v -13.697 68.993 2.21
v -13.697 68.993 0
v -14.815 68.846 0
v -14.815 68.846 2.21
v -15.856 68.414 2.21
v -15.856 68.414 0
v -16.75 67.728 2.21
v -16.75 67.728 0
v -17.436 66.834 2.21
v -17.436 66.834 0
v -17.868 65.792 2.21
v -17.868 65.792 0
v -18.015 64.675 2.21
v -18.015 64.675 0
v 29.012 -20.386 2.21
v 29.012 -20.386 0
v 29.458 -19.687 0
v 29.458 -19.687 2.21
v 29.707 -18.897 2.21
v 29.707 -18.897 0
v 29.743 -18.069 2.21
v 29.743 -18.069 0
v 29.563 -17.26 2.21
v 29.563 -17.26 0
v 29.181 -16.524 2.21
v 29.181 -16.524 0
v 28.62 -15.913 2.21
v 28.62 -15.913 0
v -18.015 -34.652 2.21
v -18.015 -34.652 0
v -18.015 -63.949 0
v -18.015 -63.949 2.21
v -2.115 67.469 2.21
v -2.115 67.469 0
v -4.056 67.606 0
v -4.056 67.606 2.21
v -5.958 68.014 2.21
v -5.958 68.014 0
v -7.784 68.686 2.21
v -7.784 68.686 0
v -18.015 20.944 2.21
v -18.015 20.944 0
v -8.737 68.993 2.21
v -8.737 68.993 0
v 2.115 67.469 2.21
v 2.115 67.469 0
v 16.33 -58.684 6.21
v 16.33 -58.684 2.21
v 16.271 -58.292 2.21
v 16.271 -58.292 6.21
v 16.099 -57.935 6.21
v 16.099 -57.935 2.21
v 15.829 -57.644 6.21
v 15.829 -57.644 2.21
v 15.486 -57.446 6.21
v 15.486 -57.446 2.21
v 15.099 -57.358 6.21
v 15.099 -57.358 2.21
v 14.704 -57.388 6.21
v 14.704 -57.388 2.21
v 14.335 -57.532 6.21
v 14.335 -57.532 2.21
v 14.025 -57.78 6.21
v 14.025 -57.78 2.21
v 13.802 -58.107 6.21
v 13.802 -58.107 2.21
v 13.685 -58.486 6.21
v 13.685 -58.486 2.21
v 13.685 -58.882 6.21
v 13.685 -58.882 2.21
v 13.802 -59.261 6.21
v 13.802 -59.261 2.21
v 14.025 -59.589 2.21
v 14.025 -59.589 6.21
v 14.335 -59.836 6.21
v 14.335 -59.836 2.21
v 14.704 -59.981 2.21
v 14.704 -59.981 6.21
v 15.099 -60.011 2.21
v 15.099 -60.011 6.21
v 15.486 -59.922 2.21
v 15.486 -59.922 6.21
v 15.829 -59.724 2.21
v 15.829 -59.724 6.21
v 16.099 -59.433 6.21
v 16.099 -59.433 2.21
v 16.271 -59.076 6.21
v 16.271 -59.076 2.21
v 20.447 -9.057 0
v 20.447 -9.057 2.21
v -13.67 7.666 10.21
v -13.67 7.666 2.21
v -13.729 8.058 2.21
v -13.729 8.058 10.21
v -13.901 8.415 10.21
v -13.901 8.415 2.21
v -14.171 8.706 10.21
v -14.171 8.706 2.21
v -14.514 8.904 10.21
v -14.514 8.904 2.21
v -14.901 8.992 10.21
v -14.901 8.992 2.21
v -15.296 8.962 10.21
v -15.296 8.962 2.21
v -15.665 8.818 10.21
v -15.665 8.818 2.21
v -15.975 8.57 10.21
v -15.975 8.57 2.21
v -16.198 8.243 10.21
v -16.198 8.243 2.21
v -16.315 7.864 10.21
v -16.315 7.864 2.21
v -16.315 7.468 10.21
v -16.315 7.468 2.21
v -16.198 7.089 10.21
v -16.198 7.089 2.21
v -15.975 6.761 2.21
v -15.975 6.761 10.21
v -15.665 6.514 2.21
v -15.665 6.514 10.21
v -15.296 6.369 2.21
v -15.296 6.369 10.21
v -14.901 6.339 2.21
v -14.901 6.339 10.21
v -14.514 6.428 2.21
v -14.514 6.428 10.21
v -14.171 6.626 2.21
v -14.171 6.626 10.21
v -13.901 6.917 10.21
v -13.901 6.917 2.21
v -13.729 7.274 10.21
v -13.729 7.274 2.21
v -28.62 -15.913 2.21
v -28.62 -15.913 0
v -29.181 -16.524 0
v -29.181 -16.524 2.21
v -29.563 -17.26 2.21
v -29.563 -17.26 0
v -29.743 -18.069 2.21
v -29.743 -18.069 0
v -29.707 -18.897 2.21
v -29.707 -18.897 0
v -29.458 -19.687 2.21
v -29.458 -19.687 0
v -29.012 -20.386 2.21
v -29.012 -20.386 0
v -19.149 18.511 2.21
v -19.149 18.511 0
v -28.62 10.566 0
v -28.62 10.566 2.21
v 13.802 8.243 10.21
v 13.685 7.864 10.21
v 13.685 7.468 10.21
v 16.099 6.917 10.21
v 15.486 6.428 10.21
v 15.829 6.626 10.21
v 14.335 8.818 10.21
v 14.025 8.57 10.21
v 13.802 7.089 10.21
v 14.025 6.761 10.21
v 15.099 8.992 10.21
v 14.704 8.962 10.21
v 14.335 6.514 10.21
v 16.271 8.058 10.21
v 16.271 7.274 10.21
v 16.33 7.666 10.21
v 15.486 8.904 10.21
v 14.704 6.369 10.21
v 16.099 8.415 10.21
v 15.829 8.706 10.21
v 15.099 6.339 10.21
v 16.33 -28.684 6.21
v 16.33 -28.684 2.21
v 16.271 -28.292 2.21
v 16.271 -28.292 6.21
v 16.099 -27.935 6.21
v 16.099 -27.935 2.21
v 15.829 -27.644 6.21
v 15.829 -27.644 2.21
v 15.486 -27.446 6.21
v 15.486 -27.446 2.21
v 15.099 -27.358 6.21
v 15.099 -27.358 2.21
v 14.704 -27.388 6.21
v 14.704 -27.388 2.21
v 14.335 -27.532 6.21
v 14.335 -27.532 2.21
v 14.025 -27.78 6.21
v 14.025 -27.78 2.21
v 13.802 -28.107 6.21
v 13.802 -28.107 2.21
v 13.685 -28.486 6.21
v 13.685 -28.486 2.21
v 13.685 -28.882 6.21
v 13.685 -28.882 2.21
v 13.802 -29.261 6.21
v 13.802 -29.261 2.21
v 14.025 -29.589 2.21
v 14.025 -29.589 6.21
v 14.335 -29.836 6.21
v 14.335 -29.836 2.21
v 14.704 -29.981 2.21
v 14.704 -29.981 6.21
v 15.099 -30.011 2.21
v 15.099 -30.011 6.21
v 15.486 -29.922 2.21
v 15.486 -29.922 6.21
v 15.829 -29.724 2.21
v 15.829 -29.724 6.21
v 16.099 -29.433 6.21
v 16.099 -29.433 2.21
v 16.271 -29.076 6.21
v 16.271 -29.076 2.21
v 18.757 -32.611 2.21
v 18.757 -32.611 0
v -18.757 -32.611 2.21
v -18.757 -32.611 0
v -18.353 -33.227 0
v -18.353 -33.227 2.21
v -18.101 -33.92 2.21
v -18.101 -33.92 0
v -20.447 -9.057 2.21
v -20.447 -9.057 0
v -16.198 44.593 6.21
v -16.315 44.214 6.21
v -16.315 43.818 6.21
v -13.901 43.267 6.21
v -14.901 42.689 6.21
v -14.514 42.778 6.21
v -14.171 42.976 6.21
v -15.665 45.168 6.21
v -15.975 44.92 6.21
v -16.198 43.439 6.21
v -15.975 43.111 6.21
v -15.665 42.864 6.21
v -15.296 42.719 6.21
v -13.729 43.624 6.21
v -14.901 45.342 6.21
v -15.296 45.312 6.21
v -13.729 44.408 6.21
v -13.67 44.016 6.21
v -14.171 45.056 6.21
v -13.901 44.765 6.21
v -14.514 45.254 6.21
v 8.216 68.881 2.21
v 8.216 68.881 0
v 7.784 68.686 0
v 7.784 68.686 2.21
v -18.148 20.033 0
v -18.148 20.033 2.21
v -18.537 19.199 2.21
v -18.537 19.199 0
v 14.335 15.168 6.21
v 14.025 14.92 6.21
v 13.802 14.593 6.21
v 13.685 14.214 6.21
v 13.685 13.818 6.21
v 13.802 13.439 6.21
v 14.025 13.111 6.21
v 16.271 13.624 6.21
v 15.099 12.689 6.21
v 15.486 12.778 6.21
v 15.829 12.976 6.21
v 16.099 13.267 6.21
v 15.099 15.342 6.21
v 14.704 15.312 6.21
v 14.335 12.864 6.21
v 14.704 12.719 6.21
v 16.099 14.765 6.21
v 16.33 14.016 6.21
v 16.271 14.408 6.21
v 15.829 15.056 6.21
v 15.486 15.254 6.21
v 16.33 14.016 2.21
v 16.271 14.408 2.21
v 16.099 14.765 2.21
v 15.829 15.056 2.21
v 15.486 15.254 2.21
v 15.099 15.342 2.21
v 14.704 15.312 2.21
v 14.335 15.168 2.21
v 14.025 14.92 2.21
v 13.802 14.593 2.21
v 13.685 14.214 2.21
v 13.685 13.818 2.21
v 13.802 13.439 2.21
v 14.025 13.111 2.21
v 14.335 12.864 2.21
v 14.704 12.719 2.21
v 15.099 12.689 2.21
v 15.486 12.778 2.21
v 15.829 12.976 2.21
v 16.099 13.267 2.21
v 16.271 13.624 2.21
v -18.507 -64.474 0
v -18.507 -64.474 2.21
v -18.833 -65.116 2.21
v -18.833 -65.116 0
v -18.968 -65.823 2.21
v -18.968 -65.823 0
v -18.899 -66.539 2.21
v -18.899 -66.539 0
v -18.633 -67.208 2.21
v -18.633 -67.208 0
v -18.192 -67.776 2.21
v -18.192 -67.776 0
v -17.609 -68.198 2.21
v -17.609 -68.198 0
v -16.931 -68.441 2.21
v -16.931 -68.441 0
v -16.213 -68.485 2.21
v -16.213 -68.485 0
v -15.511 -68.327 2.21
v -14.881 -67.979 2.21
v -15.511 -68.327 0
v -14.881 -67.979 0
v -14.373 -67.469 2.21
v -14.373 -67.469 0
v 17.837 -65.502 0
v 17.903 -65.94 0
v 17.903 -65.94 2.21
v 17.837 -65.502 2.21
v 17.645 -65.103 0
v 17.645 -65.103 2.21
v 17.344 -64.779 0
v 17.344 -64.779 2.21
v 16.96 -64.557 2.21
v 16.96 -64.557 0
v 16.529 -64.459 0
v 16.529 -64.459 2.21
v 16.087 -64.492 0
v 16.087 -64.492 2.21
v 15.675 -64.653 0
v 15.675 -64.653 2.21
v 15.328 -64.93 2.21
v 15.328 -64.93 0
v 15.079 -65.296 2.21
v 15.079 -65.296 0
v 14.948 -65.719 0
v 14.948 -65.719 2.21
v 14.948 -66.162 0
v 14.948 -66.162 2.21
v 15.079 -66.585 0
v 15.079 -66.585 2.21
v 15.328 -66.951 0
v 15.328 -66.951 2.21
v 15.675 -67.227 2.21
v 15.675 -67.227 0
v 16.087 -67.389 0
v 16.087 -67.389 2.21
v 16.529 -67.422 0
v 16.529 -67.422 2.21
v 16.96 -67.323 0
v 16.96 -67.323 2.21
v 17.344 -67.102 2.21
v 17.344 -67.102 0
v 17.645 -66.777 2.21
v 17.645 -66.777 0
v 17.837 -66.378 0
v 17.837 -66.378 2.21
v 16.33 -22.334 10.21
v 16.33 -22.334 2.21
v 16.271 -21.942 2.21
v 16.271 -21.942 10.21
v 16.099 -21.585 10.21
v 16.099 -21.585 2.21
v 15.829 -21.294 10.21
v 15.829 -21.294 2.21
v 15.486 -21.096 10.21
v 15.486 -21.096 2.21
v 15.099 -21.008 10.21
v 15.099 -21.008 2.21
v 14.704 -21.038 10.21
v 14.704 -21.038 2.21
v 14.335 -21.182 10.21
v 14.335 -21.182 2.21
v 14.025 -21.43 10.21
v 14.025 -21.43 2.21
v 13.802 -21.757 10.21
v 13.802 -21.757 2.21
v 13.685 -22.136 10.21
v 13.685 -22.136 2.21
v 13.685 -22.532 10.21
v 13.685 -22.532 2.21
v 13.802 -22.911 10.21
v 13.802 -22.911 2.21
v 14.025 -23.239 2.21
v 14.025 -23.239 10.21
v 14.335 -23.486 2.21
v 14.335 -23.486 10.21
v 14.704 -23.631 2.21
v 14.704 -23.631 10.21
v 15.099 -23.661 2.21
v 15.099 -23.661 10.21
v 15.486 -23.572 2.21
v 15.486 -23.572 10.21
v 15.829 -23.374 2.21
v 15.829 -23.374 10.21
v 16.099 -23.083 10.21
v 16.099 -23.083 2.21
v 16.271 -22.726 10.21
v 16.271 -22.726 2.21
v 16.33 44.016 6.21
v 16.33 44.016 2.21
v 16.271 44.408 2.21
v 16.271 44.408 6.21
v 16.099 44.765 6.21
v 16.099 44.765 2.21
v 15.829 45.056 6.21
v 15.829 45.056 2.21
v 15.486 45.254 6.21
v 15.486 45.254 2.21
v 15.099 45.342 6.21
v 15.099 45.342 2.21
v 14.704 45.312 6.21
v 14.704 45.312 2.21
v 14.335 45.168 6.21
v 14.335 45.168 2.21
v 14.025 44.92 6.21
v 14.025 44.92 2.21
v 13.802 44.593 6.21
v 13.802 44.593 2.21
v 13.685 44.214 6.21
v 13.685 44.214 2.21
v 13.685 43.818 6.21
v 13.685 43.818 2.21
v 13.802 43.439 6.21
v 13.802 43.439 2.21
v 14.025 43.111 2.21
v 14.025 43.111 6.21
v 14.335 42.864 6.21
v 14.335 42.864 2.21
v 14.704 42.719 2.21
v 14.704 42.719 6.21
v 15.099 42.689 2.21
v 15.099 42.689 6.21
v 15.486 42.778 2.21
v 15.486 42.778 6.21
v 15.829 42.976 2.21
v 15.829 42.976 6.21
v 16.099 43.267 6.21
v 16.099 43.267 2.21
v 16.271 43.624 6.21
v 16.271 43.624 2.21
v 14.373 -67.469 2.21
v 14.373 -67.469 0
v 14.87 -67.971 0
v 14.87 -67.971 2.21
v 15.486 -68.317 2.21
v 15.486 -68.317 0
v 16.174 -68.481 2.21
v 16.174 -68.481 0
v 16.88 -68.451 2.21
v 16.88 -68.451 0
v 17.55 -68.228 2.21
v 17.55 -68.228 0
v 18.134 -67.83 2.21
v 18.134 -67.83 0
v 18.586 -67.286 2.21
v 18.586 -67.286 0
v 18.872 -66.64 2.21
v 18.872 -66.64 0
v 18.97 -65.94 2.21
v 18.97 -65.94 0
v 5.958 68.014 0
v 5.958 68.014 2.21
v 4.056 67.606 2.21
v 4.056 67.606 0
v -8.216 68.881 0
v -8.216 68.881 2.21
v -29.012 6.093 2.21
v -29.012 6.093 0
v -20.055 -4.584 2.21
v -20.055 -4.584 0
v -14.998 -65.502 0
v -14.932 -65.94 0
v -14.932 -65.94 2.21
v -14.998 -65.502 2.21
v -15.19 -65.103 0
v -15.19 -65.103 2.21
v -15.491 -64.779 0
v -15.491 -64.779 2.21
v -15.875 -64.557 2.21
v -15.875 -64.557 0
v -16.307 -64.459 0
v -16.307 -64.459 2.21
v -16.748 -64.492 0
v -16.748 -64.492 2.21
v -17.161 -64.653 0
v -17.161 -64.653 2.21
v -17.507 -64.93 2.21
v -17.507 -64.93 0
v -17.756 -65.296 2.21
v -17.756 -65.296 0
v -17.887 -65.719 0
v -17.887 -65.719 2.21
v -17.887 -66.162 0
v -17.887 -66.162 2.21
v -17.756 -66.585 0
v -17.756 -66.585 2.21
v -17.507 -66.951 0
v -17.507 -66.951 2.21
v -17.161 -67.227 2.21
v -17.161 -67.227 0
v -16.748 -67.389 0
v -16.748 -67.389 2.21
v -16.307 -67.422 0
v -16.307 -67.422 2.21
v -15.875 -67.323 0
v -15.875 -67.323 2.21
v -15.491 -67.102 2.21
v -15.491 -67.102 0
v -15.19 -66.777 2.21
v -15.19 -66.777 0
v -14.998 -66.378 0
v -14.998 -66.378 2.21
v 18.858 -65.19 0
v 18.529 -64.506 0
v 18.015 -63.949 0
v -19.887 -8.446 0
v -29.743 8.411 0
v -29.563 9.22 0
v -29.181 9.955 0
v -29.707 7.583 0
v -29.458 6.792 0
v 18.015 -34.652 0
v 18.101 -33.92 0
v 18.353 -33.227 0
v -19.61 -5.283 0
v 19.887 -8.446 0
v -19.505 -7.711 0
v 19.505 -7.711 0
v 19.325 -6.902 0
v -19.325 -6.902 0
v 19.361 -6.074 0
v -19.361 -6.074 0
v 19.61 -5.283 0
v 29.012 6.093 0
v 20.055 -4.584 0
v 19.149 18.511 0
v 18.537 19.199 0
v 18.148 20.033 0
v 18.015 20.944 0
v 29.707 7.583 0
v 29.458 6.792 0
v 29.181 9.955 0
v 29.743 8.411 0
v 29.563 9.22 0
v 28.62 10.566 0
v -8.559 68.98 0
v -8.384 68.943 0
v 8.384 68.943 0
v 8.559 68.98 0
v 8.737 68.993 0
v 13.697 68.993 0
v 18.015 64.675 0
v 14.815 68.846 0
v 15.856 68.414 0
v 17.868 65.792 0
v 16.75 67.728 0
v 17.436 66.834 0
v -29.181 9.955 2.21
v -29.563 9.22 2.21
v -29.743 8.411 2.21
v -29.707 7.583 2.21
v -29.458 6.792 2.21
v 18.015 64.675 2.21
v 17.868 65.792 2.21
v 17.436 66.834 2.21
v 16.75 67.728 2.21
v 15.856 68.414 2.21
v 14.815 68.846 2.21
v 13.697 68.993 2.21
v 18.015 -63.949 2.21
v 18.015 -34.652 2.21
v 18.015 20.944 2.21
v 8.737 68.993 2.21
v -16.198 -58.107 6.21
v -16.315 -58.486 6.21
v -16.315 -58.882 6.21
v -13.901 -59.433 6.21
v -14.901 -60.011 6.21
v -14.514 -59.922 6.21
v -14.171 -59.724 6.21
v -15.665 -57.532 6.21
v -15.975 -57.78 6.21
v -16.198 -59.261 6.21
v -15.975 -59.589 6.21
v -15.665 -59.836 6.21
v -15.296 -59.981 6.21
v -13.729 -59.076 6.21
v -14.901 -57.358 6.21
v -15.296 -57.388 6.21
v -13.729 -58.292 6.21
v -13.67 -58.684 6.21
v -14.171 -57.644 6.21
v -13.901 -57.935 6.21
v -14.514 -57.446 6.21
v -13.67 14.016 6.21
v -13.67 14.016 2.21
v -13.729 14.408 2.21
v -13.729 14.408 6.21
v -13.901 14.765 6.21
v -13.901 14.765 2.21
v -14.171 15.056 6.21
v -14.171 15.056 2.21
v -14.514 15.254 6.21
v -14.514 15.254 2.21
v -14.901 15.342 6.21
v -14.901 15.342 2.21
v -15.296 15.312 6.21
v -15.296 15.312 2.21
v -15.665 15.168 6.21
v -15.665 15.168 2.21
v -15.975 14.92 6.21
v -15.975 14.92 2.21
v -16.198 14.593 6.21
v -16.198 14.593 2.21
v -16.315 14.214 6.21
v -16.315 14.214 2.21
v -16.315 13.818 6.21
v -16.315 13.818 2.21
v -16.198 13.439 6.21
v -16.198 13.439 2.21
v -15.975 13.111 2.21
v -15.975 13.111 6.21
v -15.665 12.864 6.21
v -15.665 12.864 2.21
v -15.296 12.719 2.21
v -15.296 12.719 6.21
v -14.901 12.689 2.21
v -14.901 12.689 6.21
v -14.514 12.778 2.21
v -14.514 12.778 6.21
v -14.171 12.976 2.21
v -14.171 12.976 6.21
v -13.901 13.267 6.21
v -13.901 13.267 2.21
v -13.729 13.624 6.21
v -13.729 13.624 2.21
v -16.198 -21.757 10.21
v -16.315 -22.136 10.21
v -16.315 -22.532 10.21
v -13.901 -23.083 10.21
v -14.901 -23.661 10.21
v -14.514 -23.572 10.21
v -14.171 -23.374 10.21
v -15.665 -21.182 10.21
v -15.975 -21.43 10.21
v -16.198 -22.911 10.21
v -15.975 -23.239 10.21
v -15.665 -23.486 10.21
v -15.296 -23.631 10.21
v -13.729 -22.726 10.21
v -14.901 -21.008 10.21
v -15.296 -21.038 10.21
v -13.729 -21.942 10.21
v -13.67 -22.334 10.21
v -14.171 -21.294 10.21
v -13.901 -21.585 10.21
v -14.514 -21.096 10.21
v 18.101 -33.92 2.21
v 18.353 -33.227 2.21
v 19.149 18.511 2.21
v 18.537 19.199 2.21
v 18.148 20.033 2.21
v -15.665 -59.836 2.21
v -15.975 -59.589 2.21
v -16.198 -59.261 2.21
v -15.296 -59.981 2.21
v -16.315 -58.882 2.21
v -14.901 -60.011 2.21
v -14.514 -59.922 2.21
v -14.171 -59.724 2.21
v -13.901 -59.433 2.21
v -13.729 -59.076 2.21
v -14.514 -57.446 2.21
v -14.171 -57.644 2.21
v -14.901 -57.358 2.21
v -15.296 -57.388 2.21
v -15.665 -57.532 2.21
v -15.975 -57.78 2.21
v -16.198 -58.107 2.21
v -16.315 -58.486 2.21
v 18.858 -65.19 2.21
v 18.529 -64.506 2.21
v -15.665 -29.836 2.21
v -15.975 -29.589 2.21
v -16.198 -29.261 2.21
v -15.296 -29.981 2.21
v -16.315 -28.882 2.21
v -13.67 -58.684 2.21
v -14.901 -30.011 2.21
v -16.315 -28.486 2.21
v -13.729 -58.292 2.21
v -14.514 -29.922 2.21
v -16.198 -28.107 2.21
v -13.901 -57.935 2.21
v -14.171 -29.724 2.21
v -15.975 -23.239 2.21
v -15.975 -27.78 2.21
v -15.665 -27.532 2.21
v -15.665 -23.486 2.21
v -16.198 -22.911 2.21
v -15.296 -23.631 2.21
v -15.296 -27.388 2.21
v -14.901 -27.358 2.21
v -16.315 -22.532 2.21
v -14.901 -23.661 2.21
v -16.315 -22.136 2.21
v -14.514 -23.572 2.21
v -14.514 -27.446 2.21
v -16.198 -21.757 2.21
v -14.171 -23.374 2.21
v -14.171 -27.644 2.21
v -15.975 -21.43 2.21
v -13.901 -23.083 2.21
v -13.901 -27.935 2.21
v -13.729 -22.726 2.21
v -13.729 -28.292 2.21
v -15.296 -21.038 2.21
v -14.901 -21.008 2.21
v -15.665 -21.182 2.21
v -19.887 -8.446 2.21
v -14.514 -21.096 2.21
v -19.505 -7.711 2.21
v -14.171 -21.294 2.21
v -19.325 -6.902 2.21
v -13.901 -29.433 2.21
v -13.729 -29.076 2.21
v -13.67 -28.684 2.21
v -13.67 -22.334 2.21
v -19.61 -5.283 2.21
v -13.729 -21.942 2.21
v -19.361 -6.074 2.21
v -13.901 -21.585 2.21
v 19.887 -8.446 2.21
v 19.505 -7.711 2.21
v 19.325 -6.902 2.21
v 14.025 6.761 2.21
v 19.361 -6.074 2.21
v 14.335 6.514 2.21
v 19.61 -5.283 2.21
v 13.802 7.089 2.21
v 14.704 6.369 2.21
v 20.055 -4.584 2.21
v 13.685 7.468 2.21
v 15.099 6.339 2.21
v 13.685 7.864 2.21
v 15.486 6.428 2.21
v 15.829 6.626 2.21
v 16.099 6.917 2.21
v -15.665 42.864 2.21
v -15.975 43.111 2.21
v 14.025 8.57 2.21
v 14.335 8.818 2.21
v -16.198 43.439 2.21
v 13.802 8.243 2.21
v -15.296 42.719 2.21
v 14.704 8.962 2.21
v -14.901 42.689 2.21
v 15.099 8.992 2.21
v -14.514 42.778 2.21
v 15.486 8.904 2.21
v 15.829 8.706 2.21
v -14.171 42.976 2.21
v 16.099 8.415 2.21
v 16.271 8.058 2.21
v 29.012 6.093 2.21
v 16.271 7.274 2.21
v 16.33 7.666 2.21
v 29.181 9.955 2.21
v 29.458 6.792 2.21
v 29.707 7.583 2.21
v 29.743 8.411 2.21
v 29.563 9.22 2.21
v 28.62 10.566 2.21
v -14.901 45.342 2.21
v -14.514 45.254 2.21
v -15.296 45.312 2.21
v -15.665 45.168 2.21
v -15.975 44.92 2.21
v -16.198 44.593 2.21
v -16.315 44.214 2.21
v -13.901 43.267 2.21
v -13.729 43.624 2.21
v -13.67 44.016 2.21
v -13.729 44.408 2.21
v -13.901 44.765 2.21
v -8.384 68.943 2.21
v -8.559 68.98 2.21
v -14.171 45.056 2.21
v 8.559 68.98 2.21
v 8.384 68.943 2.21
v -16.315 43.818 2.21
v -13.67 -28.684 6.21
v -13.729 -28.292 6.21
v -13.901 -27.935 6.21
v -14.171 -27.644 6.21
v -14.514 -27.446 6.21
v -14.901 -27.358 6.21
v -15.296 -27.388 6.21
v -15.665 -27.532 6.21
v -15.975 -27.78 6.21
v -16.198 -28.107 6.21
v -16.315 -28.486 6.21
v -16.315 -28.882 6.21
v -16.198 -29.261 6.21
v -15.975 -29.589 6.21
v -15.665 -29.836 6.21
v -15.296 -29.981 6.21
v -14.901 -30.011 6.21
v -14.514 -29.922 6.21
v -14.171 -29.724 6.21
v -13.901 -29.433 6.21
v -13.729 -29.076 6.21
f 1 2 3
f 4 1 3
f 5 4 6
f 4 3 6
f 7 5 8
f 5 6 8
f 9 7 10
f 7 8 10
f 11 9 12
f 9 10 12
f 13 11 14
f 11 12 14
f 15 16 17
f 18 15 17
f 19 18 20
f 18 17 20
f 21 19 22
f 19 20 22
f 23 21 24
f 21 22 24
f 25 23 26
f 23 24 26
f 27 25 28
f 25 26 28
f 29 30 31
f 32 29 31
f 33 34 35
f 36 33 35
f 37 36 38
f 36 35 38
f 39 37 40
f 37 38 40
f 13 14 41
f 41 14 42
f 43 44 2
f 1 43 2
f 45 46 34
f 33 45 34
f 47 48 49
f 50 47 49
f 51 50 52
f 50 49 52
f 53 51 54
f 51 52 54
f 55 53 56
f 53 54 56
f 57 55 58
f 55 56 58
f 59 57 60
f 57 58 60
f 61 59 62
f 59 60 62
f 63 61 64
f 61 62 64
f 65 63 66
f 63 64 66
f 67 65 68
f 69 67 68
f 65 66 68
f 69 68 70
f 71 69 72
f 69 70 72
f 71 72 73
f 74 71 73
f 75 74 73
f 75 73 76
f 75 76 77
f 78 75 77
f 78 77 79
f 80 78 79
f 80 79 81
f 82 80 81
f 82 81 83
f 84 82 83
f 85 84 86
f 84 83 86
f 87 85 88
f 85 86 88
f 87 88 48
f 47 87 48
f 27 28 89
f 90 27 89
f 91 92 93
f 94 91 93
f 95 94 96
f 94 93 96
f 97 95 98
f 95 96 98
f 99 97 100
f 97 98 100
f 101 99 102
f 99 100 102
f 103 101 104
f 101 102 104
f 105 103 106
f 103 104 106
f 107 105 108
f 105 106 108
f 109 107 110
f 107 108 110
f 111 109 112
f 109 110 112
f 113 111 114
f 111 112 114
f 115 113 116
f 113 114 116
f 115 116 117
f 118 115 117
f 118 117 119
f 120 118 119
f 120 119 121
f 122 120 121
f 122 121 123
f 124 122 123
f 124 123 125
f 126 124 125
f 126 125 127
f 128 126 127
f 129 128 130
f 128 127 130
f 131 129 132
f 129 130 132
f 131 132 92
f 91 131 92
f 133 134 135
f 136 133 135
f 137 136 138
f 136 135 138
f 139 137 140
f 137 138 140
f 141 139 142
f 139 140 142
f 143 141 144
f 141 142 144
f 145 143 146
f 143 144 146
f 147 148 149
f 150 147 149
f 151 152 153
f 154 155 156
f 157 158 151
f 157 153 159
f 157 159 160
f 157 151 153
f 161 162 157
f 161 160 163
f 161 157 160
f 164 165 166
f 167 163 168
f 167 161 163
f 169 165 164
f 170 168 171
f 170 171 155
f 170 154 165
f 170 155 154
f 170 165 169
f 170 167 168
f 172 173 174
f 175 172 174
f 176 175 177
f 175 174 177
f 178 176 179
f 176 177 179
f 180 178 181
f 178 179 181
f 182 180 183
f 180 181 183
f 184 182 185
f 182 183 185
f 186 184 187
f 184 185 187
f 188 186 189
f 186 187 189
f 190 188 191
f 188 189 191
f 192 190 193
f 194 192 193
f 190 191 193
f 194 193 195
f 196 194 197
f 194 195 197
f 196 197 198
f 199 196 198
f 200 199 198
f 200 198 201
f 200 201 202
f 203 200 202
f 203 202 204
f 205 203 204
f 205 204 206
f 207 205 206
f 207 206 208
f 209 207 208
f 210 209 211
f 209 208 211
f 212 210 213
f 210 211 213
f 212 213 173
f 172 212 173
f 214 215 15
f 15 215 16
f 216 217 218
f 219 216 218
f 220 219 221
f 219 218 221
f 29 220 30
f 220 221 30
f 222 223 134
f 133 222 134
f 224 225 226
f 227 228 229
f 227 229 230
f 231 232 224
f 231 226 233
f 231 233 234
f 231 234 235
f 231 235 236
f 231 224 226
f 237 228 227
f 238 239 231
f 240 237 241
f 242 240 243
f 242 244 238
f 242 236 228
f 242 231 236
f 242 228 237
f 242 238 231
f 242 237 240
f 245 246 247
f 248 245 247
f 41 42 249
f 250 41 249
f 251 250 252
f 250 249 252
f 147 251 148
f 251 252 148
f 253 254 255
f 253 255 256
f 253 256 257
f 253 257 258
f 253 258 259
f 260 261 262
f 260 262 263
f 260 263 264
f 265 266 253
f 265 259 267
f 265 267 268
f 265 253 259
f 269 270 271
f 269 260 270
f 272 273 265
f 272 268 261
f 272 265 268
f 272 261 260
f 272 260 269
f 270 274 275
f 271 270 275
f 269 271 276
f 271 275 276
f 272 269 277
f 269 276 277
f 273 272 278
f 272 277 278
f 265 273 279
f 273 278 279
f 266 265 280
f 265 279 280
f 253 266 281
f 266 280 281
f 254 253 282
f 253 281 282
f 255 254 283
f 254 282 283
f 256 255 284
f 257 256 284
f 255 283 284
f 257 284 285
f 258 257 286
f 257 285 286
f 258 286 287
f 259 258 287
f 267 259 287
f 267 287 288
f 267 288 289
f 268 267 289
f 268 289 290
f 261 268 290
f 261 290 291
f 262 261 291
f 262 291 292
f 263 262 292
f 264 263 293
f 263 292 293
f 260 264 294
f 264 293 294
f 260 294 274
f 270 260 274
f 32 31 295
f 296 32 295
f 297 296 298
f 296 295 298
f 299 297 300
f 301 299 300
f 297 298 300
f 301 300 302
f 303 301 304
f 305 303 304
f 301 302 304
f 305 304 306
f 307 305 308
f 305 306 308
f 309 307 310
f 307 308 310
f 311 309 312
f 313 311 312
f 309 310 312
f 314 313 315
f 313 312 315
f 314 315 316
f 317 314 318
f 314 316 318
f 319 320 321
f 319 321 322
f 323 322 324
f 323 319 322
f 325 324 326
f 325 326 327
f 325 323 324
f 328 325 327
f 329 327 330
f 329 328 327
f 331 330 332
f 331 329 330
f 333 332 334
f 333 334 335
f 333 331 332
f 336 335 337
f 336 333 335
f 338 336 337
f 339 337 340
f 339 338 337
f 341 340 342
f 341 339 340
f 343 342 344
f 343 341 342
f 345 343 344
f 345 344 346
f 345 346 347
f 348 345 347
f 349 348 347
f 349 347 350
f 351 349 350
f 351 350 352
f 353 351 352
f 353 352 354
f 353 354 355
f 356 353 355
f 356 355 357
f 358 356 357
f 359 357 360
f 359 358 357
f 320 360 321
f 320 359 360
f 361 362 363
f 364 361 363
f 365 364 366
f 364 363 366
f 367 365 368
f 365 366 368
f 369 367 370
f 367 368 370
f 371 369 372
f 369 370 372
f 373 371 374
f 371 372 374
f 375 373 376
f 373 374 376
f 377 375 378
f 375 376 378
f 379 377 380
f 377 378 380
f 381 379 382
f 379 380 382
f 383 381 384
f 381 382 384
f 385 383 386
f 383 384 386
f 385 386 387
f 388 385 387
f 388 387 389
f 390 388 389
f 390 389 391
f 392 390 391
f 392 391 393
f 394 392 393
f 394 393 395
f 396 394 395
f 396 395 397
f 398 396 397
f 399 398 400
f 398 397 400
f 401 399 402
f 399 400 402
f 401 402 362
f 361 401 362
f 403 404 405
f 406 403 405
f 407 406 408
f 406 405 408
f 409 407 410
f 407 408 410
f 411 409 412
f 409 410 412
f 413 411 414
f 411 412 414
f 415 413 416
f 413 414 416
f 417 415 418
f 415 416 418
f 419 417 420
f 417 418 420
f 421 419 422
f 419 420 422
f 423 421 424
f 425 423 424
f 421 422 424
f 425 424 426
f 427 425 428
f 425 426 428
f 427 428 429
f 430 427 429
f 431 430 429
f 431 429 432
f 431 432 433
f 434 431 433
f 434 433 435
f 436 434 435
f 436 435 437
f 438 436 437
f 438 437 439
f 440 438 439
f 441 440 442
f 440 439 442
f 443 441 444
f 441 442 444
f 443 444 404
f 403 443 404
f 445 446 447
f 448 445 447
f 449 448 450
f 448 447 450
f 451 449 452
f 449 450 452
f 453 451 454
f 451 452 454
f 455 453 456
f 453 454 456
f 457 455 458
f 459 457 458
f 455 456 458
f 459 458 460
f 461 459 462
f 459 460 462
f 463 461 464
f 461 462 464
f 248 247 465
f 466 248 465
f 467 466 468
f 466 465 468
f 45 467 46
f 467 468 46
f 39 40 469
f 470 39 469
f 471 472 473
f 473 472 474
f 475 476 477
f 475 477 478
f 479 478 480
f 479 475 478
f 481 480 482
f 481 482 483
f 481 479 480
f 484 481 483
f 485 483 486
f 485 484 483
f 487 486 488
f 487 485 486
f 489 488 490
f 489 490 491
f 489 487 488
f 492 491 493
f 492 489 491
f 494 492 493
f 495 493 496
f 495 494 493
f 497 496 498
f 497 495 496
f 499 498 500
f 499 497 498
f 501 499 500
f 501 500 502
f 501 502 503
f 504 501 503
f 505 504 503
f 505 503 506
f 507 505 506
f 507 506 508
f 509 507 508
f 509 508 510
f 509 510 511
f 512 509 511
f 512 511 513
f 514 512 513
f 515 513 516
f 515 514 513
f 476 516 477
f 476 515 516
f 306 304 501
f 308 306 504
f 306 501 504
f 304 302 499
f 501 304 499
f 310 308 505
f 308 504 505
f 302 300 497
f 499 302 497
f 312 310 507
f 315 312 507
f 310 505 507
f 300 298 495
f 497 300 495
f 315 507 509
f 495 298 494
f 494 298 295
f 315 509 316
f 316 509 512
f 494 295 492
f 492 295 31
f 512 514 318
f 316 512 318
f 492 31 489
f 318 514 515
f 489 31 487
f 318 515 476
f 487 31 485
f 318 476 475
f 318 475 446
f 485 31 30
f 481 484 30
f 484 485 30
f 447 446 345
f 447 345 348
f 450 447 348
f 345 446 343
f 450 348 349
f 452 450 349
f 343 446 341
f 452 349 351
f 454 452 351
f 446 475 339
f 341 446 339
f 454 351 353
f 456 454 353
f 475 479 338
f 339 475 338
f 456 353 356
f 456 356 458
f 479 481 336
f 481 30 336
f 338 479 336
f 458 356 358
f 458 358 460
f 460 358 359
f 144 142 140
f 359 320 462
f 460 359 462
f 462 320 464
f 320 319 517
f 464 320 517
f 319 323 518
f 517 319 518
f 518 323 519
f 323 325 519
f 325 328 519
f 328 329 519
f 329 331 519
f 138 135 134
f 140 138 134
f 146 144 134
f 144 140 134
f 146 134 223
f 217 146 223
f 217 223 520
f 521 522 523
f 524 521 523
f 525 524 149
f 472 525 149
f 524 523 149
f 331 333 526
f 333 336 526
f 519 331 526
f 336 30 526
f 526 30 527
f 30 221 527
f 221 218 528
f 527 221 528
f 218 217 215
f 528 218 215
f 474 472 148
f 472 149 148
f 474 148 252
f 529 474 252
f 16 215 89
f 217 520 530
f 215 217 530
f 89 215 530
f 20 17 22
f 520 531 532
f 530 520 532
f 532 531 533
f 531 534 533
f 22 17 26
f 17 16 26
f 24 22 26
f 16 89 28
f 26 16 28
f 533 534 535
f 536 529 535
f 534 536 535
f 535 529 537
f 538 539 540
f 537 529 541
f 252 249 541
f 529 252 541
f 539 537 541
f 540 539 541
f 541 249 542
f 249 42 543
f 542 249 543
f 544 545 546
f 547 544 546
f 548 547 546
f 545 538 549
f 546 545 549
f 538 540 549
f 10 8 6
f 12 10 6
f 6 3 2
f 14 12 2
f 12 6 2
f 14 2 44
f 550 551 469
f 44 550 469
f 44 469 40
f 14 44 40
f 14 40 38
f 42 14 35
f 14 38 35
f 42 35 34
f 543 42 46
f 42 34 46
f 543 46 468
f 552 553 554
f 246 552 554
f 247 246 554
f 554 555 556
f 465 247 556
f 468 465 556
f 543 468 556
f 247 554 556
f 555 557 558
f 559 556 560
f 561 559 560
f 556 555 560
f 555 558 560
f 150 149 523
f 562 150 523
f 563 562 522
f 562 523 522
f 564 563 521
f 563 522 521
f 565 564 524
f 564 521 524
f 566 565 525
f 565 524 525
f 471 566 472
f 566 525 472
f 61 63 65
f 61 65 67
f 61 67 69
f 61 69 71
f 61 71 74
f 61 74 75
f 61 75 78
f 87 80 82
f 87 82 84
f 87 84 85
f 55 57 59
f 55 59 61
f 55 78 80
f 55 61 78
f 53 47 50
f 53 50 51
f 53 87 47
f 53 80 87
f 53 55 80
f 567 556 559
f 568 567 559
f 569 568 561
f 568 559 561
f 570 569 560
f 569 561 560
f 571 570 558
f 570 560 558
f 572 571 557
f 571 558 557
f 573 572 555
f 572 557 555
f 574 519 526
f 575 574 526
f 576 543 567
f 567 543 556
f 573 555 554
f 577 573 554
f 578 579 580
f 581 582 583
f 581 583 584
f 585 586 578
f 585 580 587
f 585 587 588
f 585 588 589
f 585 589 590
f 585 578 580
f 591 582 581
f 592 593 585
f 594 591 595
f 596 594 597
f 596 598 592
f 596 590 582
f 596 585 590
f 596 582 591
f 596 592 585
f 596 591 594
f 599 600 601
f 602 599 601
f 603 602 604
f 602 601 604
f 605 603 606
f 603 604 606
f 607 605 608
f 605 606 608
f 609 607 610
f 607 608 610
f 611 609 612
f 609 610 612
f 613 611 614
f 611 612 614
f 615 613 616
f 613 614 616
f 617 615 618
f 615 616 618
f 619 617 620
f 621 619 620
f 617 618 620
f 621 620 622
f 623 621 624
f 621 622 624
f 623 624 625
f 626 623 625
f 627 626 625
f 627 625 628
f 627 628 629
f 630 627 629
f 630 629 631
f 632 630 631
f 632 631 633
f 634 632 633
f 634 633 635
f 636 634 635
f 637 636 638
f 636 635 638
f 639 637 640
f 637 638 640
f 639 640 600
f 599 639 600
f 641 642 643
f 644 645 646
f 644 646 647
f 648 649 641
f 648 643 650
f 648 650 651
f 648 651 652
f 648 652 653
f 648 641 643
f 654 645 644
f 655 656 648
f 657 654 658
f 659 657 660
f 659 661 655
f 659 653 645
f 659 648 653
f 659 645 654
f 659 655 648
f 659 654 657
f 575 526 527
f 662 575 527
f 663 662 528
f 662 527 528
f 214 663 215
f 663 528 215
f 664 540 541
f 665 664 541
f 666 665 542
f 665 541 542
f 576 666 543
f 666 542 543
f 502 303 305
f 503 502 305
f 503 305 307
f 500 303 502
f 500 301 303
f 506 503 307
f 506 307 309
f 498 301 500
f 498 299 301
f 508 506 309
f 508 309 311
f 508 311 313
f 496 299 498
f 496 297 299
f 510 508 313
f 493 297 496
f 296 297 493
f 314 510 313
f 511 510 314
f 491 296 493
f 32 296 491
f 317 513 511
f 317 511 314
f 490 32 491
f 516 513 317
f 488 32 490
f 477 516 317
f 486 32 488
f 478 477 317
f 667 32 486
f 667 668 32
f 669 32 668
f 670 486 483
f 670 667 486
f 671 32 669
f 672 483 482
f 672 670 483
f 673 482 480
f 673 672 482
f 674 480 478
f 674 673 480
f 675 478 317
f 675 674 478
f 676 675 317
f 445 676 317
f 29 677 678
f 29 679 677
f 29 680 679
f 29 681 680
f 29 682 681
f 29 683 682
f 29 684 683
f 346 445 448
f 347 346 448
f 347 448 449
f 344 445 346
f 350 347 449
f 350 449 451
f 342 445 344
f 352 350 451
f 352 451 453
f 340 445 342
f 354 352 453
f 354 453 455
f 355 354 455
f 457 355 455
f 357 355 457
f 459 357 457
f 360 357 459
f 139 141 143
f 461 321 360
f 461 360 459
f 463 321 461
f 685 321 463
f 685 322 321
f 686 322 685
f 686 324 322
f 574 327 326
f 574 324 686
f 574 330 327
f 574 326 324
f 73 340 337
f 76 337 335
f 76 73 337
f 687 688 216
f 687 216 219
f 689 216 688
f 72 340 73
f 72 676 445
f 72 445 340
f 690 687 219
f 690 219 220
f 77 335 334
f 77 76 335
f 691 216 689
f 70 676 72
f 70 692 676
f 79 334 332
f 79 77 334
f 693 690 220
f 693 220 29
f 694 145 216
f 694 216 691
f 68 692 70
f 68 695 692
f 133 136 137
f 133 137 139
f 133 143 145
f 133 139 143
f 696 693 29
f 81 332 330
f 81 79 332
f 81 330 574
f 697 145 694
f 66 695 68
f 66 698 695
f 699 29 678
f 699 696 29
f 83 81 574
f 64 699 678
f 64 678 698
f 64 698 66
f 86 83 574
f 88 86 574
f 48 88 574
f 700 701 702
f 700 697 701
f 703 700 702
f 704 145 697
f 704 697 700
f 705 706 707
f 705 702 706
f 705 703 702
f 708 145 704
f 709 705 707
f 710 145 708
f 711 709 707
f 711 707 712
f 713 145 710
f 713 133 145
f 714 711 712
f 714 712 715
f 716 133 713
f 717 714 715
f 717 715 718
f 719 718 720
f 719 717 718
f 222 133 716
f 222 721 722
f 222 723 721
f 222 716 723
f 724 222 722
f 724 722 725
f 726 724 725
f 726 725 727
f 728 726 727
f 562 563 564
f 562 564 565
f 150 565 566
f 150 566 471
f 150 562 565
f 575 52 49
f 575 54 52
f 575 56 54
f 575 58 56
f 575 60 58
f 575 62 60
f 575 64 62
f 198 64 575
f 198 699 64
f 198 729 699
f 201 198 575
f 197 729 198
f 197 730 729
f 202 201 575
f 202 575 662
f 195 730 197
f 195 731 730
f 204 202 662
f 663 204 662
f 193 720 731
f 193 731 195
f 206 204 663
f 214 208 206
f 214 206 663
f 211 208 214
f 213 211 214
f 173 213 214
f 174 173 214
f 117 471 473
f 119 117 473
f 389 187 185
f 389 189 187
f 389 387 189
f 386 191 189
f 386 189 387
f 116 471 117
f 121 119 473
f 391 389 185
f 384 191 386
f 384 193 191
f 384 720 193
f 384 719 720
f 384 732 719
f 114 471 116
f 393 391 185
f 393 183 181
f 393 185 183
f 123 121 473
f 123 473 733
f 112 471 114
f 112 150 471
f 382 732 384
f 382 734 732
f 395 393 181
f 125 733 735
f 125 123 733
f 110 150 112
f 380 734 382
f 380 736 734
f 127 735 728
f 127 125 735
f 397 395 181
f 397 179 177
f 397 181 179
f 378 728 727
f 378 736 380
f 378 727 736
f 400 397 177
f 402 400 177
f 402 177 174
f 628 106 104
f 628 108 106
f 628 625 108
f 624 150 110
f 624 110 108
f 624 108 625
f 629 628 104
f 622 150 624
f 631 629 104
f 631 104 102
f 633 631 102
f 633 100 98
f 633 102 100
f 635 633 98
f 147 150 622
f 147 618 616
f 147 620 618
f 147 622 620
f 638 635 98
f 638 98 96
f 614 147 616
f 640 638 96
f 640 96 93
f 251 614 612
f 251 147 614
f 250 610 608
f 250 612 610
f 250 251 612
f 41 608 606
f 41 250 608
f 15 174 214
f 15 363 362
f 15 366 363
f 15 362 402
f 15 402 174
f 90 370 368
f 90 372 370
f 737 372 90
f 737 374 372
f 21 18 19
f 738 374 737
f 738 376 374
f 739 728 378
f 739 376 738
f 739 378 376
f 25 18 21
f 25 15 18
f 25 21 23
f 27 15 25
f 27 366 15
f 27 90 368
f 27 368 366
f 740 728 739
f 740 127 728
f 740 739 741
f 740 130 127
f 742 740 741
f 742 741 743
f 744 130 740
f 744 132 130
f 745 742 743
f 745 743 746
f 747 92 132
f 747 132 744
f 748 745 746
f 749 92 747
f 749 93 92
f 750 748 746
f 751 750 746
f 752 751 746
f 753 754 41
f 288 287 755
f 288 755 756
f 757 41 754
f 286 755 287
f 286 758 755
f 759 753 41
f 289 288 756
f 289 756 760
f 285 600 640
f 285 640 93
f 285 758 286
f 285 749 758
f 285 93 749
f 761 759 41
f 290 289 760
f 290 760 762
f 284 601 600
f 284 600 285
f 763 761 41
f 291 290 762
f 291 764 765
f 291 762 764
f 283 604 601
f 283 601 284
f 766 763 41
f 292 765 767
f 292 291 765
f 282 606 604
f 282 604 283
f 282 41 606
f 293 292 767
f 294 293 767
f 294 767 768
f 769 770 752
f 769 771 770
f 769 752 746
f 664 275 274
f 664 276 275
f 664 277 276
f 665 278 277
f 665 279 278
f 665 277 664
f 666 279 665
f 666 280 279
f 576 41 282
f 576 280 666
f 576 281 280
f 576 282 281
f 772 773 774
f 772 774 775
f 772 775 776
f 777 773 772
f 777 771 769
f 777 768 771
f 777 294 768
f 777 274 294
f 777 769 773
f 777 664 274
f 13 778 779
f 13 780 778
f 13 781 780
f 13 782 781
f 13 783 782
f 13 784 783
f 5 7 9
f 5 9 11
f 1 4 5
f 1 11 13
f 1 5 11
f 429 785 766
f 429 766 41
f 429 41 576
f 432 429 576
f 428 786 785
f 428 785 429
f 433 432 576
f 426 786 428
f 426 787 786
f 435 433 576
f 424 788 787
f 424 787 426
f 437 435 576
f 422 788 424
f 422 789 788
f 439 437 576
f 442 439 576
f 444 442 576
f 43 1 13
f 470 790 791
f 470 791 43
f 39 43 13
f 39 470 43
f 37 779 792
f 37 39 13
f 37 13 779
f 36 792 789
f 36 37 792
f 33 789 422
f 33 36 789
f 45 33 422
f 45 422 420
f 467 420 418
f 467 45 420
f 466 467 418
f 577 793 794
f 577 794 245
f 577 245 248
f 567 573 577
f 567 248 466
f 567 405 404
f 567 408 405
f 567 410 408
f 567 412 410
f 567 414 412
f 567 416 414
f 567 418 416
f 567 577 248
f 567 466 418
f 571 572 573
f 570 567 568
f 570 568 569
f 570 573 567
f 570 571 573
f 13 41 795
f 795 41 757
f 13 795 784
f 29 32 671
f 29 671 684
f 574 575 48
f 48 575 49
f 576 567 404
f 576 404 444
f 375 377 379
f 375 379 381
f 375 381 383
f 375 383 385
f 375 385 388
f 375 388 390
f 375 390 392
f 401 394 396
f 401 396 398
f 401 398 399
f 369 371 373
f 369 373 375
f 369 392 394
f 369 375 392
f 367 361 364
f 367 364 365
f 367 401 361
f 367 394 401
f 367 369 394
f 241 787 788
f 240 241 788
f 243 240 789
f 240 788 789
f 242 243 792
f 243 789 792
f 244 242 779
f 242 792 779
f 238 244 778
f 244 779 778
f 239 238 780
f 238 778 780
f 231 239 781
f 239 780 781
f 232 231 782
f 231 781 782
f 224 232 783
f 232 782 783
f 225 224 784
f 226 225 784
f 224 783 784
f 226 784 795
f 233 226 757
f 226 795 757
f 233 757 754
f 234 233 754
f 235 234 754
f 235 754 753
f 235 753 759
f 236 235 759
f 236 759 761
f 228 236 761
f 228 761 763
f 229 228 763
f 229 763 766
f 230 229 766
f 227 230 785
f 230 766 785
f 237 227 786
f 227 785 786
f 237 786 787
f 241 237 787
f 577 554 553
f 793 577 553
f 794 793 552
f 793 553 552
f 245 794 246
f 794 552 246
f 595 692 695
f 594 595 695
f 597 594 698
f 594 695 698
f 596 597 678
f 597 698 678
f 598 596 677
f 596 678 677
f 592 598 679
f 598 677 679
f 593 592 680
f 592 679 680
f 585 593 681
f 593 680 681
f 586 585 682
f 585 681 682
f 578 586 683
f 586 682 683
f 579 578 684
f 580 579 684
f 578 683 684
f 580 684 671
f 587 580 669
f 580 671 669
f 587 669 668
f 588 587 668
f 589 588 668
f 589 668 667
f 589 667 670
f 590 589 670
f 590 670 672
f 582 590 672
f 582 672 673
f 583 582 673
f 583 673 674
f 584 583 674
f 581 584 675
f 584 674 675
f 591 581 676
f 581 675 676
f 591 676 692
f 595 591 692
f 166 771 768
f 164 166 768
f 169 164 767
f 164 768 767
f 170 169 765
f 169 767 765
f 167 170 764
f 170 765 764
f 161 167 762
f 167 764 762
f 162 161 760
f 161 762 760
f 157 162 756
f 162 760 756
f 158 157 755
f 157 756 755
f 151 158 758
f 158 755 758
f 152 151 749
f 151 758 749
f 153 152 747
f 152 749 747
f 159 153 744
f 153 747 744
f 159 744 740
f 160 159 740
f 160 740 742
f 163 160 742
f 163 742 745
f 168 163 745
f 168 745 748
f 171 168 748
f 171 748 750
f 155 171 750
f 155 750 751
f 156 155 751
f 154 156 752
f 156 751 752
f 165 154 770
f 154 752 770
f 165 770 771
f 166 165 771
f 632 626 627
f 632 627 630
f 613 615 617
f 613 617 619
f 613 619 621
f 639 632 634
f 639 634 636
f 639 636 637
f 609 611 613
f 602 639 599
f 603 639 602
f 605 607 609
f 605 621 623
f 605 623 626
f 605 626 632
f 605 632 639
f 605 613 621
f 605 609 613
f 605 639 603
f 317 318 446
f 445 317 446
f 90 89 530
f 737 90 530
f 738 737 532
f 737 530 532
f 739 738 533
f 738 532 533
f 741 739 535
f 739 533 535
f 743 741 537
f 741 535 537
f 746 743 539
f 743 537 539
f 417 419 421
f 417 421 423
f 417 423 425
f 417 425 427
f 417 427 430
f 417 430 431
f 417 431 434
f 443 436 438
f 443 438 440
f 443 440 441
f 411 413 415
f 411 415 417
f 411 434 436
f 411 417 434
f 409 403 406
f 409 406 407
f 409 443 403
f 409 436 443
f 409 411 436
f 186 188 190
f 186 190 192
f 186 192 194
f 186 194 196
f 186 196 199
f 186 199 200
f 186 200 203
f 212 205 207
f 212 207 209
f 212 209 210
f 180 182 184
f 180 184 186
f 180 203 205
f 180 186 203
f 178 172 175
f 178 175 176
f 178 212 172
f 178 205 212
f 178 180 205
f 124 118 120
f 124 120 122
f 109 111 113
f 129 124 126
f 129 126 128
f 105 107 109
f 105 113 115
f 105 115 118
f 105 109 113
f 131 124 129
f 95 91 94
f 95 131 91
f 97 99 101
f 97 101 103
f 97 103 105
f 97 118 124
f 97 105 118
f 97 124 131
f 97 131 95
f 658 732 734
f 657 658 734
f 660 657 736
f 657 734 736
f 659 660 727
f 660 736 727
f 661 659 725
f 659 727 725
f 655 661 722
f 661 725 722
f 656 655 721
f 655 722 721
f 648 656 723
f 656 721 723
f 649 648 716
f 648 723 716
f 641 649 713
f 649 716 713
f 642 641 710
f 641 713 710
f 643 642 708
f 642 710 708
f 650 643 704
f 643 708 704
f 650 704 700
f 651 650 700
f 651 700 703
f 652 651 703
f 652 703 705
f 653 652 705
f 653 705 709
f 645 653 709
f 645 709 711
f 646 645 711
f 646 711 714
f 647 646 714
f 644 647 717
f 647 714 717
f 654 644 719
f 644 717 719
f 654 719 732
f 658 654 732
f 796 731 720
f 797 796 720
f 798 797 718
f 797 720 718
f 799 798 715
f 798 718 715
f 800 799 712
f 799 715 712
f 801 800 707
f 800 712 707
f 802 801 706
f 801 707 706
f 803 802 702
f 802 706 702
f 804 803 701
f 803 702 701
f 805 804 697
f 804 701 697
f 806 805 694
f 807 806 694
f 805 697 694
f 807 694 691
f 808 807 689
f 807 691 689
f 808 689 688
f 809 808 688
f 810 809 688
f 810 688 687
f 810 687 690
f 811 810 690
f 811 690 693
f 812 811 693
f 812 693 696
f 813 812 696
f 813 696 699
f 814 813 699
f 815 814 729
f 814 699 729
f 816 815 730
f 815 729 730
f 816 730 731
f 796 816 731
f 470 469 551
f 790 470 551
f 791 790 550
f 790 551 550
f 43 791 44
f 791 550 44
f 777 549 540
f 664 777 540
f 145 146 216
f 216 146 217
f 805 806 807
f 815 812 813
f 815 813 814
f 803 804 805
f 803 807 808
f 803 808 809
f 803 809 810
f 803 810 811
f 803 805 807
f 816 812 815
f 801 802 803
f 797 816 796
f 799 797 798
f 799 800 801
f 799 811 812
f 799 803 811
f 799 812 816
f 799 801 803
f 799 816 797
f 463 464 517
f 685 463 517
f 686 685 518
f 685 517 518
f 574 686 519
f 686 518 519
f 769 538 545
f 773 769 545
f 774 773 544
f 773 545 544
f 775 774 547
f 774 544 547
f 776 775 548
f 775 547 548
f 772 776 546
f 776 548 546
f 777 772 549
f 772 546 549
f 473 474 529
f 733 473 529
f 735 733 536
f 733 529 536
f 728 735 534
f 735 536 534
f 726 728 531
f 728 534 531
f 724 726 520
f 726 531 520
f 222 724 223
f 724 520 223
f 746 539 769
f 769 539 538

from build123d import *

# Parameters (mm, degrees)
F0_R     = 1.4859
F1_DEPTH = 2.2098
F2_R     = 1.33
F3_DEPTH = 4
F4_DEPTH = 8


with BuildPart() as f1:
    # F0 (on Top) → F1 (new body)
    with BuildSketch(Plane.XY):
        with BuildLine():
            Line((2.114807, 67.46875), (-2.114807, 67.46875))
            ThreePointArc((-2.114807, 67.46875), (-5.0139, 67.776541), (-7.783739, 68.686193))
            Line((-7.783739, 68.686193), (-8.215857, 68.880768))
            ThreePointArc((-8.215857, 68.880768), (-8.47063, 68.964439), (-8.737292, 68.99275))
            Line((-8.737292, 68.99275), (-13.69695, 68.99275))
            ThreePointArc((-13.69695, 68.99275), (-16.750237, 67.728037), (-18.01495, 64.67475))
            Line((-18.01495, 64.67475), (-18.01495, 20.943534))
            ThreePointArc((-18.01495, 20.943534), (-18.312512, 19.601529), (-19.149422, 18.511071))
            Line((-19.149422, 18.511071), (-28.620485, 10.56605))
            ThreePointArc((-28.620485, 10.56605), (-29.742839, 8.410727), (-29.01242, 6.09306))
            Line((-29.01242, 6.09306), (-20.055478, -4.584288))
            ThreePointArc((-20.055478, -4.584288), (-19.325058, -6.901955), (-20.447412, -9.057278))
            Line((-20.447412, -9.057278), (-28.620485, -15.91345))
            ThreePointArc((-28.620485, -15.91345), (-29.742839, -18.068773), (-29.01242, -20.38644))
            Line((-29.01242, -20.38644), (-18.757488, -32.611089))
            ThreePointArc((-18.757488, -32.611089), (-18.206354, -33.565901), (-18.01495, -34.651617))
            Line((-18.01495, -34.651617), (-18.01495, -63.949145))
            ThreePointArc((-18.01495, -63.949145), (-15.313338, -63.63877), (-13.864863, -65.940283))
            ThreePointArc((-13.864863, -65.940283), (-13.995237, -66.745649), (-14.373042, -67.46875))
            Line((-14.373042, -67.46875), (14.373042, -67.46875))
            ThreePointArc((14.373042, -67.46875), (14.643616, -64.104693), (18.01495, -63.949145))
            Line((18.01495, -63.949145), (18.01495, -34.651617))
            ThreePointArc((18.01495, -34.651617), (18.206354, -33.565901), (18.757488, -32.611089))
            Line((18.757488, -32.611089), (29.01242, -20.38644))
            ThreePointArc((29.01242, -20.38644), (29.742839, -18.068773), (28.620485, -15.91345))
            Line((28.620485, -15.91345), (20.447412, -9.057278))
            ThreePointArc((20.447412, -9.057278), (19.325058, -6.901955), (20.055478, -4.584288))
            Line((20.055478, -4.584288), (29.01242, 6.09306))
            ThreePointArc((29.01242, 6.09306), (29.742839, 8.410727), (28.620485, 10.56605))
            Line((28.620485, 10.56605), (19.149422, 18.511071))
            ThreePointArc((19.149422, 18.511071), (18.312512, 19.601529), (18.01495, 20.943534))
            Line((18.01495, 20.943534), (18.01495, 64.67475))
            ThreePointArc((18.01495, 64.67475), (16.750237, 67.728037), (13.69695, 68.99275))
            Line((13.69695, 68.99275), (8.737292, 68.99275))
            ThreePointArc((8.737292, 68.99275), (8.47063, 68.964439), (8.215857, 68.880768))
            Line((8.215857, 68.880768), (7.783739, 68.686193))
            ThreePointArc((7.783739, 68.686193), (5.0139, 67.776541), (2.114807, 67.46875))
        make_face()
        with BuildLine():
            ThreePointArc((-13.864863, -65.940283), (-15.313338, -63.63877), (-18.01495, -63.949145))
            ThreePointArc((-18.01495, -63.949145), (-18.19151, -67.775873), (-14.373042, -67.46875))
            ThreePointArc((-14.373042, -67.46875), (-13.995237, -66.745649), (-13.864863, -65.940283))
        make_face()
        with Locations((-16.417563, -65.940283)):
            Circle(F0_R, mode=Mode.SUBTRACT)
        with BuildLine():
            ThreePointArc((18.970263, -65.940283), (18.719076, -64.836058), (18.01495, -63.949145))
            ThreePointArc((18.01495, -63.949145), (14.643616, -64.104693), (14.373042, -67.46875))
            ThreePointArc((14.373042, -67.46875), (17.222929, -68.362609), (18.970263, -65.940283))
        make_face()
        with Locations((16.417563, -65.940283)):
            Circle(F0_R, mode=Mode.SUBTRACT)
    extrude(amount=F1_DEPTH)

    # F2 (on face) → F3 (join)
    with BuildSketch(Plane.XY.offset(2.2098)):
        with Locations((-15, 44.01575)):
            Circle(F2_R)
        with Locations((15, 44.01575)):
            Circle(F2_R)
        with Locations((15, 14.01575)):
            Circle(F2_R)
        with Locations((-15, 14.01575)):
            Circle(F2_R)
        with Locations((15, -28.68425)):
            Circle(F2_R)
        with Locations((-15, -28.68425)):
            Circle(F2_R)
        with Locations((-15, -58.68425)):
            Circle(F2_R)
        with Locations((15, -58.68425)):
            Circle(F2_R)
    extrude(amount=F3_DEPTH)

    # F2 (on face) → F4 (join)
    with BuildSketch(Plane.XY.offset(2.2098)):
        with Locations((15, 7.66575)):
            Circle(F2_R)
        with Locations((15, -22.33425)):
            Circle(F2_R)
        with Locations((-15, -22.33425)):
            Circle(F2_R)
        with Locations((-15, 7.66575)):
            Circle(F2_R)
    extrude(amount=F4_DEPTH)


solid = f1.part
